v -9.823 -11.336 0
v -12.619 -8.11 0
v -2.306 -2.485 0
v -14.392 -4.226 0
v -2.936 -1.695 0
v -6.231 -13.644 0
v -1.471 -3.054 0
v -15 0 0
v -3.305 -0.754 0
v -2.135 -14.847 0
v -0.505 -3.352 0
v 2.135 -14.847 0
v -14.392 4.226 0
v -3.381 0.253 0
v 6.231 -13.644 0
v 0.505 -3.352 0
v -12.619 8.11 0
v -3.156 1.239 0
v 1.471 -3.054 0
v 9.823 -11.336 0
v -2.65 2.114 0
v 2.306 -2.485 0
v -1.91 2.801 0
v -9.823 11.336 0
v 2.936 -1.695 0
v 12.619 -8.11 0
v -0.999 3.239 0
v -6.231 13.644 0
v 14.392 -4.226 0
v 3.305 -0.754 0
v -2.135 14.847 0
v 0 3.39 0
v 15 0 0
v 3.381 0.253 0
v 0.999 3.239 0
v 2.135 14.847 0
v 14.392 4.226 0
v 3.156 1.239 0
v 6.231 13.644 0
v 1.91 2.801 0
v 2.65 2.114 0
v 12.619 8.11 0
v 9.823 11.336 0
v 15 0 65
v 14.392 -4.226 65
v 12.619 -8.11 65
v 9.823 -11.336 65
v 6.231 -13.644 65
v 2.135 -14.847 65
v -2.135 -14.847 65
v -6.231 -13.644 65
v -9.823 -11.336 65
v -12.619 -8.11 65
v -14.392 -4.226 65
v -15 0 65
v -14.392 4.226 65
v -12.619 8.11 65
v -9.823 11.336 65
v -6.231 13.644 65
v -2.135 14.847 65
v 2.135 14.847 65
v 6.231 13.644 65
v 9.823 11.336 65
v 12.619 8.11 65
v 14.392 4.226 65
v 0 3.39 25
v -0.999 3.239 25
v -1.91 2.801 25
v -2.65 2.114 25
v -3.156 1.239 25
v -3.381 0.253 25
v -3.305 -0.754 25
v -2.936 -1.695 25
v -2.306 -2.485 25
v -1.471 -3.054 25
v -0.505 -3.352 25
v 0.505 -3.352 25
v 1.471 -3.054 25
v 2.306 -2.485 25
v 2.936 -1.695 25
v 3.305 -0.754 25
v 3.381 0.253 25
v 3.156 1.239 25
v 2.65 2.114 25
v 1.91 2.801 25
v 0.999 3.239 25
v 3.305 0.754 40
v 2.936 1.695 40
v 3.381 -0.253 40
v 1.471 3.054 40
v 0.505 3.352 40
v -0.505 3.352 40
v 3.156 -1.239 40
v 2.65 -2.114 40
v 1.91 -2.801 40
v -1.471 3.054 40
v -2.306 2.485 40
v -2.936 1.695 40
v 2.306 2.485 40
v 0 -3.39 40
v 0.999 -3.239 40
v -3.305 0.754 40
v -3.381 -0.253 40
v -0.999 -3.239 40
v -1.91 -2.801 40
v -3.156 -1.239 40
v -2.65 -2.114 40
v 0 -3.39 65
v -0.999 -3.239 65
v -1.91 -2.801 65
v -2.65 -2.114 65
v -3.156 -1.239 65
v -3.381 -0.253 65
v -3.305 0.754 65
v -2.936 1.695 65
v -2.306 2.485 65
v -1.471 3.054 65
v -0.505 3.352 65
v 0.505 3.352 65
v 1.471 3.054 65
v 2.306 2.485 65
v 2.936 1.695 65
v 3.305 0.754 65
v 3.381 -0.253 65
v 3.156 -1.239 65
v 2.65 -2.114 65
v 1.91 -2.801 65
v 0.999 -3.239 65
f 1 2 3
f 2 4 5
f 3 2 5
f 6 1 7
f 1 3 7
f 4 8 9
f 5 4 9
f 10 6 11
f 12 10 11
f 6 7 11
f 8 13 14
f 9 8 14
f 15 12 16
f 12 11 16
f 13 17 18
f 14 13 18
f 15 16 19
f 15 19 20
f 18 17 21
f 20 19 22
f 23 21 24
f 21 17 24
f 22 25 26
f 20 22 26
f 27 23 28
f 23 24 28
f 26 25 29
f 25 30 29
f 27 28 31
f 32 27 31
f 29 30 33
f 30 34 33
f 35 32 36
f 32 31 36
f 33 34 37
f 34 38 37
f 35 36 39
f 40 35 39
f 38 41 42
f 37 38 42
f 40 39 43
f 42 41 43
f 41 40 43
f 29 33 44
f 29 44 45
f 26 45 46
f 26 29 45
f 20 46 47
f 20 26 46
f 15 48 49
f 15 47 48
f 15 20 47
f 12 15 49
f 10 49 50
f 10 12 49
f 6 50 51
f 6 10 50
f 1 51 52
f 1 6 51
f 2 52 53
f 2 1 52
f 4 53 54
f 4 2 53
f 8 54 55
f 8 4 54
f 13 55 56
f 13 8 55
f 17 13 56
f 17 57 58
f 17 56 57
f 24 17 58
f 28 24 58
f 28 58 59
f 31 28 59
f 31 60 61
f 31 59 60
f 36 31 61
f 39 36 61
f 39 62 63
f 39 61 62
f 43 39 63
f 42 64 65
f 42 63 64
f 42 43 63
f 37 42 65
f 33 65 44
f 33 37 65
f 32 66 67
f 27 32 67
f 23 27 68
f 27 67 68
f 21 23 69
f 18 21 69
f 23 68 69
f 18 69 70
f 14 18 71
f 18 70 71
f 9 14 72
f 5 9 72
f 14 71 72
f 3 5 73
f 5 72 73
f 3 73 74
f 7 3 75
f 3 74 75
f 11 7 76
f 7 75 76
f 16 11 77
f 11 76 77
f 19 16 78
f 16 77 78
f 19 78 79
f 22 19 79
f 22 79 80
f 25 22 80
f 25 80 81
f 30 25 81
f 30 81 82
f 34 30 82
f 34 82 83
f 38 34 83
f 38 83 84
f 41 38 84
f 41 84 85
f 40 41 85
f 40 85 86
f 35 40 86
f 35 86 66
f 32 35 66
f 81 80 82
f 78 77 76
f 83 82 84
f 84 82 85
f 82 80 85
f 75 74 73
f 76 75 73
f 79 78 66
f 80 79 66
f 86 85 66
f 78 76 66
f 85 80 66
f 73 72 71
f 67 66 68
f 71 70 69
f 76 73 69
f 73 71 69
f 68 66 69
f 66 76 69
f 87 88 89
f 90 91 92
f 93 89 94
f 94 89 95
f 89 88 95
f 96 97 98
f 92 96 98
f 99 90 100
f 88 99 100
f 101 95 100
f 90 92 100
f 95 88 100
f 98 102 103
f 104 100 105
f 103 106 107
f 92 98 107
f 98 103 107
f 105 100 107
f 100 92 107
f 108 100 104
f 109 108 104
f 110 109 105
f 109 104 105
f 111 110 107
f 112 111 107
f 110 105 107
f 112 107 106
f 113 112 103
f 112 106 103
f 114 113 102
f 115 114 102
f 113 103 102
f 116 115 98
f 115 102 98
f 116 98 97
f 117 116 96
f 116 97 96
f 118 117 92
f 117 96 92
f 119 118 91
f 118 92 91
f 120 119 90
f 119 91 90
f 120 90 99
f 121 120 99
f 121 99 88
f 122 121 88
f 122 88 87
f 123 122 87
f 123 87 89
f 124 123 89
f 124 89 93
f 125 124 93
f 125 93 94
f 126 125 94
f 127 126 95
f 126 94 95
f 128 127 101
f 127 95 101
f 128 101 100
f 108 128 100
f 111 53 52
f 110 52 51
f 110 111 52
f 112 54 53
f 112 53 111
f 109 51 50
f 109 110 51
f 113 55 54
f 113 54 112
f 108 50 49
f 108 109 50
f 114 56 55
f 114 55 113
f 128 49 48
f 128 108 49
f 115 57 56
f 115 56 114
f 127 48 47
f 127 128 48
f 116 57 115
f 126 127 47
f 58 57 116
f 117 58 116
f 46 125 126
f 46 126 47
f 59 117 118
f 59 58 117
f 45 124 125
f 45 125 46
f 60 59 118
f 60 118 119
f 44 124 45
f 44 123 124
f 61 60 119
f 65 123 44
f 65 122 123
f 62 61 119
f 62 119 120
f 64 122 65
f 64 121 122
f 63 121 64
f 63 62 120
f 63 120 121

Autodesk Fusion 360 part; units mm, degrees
sketch "Sketch1" plane through (0, 0, 0) normal (0, 0, 1) x (1, 0, 0)
  circle A0 centre (0, 0) radius 15
  dimension "d1" = 30
extrude "Extrude1" add sketch "Sketch1" along normal blind 65
hole "Hole1" at (0, 0, 65) direction (0, 0, -1) diameter 6.78 depth 25 tip angle 180
hole "Hole2" at (0, 0, 0) direction (0, 0, 1) diameter 6.78 depth 25 tip angle 180
